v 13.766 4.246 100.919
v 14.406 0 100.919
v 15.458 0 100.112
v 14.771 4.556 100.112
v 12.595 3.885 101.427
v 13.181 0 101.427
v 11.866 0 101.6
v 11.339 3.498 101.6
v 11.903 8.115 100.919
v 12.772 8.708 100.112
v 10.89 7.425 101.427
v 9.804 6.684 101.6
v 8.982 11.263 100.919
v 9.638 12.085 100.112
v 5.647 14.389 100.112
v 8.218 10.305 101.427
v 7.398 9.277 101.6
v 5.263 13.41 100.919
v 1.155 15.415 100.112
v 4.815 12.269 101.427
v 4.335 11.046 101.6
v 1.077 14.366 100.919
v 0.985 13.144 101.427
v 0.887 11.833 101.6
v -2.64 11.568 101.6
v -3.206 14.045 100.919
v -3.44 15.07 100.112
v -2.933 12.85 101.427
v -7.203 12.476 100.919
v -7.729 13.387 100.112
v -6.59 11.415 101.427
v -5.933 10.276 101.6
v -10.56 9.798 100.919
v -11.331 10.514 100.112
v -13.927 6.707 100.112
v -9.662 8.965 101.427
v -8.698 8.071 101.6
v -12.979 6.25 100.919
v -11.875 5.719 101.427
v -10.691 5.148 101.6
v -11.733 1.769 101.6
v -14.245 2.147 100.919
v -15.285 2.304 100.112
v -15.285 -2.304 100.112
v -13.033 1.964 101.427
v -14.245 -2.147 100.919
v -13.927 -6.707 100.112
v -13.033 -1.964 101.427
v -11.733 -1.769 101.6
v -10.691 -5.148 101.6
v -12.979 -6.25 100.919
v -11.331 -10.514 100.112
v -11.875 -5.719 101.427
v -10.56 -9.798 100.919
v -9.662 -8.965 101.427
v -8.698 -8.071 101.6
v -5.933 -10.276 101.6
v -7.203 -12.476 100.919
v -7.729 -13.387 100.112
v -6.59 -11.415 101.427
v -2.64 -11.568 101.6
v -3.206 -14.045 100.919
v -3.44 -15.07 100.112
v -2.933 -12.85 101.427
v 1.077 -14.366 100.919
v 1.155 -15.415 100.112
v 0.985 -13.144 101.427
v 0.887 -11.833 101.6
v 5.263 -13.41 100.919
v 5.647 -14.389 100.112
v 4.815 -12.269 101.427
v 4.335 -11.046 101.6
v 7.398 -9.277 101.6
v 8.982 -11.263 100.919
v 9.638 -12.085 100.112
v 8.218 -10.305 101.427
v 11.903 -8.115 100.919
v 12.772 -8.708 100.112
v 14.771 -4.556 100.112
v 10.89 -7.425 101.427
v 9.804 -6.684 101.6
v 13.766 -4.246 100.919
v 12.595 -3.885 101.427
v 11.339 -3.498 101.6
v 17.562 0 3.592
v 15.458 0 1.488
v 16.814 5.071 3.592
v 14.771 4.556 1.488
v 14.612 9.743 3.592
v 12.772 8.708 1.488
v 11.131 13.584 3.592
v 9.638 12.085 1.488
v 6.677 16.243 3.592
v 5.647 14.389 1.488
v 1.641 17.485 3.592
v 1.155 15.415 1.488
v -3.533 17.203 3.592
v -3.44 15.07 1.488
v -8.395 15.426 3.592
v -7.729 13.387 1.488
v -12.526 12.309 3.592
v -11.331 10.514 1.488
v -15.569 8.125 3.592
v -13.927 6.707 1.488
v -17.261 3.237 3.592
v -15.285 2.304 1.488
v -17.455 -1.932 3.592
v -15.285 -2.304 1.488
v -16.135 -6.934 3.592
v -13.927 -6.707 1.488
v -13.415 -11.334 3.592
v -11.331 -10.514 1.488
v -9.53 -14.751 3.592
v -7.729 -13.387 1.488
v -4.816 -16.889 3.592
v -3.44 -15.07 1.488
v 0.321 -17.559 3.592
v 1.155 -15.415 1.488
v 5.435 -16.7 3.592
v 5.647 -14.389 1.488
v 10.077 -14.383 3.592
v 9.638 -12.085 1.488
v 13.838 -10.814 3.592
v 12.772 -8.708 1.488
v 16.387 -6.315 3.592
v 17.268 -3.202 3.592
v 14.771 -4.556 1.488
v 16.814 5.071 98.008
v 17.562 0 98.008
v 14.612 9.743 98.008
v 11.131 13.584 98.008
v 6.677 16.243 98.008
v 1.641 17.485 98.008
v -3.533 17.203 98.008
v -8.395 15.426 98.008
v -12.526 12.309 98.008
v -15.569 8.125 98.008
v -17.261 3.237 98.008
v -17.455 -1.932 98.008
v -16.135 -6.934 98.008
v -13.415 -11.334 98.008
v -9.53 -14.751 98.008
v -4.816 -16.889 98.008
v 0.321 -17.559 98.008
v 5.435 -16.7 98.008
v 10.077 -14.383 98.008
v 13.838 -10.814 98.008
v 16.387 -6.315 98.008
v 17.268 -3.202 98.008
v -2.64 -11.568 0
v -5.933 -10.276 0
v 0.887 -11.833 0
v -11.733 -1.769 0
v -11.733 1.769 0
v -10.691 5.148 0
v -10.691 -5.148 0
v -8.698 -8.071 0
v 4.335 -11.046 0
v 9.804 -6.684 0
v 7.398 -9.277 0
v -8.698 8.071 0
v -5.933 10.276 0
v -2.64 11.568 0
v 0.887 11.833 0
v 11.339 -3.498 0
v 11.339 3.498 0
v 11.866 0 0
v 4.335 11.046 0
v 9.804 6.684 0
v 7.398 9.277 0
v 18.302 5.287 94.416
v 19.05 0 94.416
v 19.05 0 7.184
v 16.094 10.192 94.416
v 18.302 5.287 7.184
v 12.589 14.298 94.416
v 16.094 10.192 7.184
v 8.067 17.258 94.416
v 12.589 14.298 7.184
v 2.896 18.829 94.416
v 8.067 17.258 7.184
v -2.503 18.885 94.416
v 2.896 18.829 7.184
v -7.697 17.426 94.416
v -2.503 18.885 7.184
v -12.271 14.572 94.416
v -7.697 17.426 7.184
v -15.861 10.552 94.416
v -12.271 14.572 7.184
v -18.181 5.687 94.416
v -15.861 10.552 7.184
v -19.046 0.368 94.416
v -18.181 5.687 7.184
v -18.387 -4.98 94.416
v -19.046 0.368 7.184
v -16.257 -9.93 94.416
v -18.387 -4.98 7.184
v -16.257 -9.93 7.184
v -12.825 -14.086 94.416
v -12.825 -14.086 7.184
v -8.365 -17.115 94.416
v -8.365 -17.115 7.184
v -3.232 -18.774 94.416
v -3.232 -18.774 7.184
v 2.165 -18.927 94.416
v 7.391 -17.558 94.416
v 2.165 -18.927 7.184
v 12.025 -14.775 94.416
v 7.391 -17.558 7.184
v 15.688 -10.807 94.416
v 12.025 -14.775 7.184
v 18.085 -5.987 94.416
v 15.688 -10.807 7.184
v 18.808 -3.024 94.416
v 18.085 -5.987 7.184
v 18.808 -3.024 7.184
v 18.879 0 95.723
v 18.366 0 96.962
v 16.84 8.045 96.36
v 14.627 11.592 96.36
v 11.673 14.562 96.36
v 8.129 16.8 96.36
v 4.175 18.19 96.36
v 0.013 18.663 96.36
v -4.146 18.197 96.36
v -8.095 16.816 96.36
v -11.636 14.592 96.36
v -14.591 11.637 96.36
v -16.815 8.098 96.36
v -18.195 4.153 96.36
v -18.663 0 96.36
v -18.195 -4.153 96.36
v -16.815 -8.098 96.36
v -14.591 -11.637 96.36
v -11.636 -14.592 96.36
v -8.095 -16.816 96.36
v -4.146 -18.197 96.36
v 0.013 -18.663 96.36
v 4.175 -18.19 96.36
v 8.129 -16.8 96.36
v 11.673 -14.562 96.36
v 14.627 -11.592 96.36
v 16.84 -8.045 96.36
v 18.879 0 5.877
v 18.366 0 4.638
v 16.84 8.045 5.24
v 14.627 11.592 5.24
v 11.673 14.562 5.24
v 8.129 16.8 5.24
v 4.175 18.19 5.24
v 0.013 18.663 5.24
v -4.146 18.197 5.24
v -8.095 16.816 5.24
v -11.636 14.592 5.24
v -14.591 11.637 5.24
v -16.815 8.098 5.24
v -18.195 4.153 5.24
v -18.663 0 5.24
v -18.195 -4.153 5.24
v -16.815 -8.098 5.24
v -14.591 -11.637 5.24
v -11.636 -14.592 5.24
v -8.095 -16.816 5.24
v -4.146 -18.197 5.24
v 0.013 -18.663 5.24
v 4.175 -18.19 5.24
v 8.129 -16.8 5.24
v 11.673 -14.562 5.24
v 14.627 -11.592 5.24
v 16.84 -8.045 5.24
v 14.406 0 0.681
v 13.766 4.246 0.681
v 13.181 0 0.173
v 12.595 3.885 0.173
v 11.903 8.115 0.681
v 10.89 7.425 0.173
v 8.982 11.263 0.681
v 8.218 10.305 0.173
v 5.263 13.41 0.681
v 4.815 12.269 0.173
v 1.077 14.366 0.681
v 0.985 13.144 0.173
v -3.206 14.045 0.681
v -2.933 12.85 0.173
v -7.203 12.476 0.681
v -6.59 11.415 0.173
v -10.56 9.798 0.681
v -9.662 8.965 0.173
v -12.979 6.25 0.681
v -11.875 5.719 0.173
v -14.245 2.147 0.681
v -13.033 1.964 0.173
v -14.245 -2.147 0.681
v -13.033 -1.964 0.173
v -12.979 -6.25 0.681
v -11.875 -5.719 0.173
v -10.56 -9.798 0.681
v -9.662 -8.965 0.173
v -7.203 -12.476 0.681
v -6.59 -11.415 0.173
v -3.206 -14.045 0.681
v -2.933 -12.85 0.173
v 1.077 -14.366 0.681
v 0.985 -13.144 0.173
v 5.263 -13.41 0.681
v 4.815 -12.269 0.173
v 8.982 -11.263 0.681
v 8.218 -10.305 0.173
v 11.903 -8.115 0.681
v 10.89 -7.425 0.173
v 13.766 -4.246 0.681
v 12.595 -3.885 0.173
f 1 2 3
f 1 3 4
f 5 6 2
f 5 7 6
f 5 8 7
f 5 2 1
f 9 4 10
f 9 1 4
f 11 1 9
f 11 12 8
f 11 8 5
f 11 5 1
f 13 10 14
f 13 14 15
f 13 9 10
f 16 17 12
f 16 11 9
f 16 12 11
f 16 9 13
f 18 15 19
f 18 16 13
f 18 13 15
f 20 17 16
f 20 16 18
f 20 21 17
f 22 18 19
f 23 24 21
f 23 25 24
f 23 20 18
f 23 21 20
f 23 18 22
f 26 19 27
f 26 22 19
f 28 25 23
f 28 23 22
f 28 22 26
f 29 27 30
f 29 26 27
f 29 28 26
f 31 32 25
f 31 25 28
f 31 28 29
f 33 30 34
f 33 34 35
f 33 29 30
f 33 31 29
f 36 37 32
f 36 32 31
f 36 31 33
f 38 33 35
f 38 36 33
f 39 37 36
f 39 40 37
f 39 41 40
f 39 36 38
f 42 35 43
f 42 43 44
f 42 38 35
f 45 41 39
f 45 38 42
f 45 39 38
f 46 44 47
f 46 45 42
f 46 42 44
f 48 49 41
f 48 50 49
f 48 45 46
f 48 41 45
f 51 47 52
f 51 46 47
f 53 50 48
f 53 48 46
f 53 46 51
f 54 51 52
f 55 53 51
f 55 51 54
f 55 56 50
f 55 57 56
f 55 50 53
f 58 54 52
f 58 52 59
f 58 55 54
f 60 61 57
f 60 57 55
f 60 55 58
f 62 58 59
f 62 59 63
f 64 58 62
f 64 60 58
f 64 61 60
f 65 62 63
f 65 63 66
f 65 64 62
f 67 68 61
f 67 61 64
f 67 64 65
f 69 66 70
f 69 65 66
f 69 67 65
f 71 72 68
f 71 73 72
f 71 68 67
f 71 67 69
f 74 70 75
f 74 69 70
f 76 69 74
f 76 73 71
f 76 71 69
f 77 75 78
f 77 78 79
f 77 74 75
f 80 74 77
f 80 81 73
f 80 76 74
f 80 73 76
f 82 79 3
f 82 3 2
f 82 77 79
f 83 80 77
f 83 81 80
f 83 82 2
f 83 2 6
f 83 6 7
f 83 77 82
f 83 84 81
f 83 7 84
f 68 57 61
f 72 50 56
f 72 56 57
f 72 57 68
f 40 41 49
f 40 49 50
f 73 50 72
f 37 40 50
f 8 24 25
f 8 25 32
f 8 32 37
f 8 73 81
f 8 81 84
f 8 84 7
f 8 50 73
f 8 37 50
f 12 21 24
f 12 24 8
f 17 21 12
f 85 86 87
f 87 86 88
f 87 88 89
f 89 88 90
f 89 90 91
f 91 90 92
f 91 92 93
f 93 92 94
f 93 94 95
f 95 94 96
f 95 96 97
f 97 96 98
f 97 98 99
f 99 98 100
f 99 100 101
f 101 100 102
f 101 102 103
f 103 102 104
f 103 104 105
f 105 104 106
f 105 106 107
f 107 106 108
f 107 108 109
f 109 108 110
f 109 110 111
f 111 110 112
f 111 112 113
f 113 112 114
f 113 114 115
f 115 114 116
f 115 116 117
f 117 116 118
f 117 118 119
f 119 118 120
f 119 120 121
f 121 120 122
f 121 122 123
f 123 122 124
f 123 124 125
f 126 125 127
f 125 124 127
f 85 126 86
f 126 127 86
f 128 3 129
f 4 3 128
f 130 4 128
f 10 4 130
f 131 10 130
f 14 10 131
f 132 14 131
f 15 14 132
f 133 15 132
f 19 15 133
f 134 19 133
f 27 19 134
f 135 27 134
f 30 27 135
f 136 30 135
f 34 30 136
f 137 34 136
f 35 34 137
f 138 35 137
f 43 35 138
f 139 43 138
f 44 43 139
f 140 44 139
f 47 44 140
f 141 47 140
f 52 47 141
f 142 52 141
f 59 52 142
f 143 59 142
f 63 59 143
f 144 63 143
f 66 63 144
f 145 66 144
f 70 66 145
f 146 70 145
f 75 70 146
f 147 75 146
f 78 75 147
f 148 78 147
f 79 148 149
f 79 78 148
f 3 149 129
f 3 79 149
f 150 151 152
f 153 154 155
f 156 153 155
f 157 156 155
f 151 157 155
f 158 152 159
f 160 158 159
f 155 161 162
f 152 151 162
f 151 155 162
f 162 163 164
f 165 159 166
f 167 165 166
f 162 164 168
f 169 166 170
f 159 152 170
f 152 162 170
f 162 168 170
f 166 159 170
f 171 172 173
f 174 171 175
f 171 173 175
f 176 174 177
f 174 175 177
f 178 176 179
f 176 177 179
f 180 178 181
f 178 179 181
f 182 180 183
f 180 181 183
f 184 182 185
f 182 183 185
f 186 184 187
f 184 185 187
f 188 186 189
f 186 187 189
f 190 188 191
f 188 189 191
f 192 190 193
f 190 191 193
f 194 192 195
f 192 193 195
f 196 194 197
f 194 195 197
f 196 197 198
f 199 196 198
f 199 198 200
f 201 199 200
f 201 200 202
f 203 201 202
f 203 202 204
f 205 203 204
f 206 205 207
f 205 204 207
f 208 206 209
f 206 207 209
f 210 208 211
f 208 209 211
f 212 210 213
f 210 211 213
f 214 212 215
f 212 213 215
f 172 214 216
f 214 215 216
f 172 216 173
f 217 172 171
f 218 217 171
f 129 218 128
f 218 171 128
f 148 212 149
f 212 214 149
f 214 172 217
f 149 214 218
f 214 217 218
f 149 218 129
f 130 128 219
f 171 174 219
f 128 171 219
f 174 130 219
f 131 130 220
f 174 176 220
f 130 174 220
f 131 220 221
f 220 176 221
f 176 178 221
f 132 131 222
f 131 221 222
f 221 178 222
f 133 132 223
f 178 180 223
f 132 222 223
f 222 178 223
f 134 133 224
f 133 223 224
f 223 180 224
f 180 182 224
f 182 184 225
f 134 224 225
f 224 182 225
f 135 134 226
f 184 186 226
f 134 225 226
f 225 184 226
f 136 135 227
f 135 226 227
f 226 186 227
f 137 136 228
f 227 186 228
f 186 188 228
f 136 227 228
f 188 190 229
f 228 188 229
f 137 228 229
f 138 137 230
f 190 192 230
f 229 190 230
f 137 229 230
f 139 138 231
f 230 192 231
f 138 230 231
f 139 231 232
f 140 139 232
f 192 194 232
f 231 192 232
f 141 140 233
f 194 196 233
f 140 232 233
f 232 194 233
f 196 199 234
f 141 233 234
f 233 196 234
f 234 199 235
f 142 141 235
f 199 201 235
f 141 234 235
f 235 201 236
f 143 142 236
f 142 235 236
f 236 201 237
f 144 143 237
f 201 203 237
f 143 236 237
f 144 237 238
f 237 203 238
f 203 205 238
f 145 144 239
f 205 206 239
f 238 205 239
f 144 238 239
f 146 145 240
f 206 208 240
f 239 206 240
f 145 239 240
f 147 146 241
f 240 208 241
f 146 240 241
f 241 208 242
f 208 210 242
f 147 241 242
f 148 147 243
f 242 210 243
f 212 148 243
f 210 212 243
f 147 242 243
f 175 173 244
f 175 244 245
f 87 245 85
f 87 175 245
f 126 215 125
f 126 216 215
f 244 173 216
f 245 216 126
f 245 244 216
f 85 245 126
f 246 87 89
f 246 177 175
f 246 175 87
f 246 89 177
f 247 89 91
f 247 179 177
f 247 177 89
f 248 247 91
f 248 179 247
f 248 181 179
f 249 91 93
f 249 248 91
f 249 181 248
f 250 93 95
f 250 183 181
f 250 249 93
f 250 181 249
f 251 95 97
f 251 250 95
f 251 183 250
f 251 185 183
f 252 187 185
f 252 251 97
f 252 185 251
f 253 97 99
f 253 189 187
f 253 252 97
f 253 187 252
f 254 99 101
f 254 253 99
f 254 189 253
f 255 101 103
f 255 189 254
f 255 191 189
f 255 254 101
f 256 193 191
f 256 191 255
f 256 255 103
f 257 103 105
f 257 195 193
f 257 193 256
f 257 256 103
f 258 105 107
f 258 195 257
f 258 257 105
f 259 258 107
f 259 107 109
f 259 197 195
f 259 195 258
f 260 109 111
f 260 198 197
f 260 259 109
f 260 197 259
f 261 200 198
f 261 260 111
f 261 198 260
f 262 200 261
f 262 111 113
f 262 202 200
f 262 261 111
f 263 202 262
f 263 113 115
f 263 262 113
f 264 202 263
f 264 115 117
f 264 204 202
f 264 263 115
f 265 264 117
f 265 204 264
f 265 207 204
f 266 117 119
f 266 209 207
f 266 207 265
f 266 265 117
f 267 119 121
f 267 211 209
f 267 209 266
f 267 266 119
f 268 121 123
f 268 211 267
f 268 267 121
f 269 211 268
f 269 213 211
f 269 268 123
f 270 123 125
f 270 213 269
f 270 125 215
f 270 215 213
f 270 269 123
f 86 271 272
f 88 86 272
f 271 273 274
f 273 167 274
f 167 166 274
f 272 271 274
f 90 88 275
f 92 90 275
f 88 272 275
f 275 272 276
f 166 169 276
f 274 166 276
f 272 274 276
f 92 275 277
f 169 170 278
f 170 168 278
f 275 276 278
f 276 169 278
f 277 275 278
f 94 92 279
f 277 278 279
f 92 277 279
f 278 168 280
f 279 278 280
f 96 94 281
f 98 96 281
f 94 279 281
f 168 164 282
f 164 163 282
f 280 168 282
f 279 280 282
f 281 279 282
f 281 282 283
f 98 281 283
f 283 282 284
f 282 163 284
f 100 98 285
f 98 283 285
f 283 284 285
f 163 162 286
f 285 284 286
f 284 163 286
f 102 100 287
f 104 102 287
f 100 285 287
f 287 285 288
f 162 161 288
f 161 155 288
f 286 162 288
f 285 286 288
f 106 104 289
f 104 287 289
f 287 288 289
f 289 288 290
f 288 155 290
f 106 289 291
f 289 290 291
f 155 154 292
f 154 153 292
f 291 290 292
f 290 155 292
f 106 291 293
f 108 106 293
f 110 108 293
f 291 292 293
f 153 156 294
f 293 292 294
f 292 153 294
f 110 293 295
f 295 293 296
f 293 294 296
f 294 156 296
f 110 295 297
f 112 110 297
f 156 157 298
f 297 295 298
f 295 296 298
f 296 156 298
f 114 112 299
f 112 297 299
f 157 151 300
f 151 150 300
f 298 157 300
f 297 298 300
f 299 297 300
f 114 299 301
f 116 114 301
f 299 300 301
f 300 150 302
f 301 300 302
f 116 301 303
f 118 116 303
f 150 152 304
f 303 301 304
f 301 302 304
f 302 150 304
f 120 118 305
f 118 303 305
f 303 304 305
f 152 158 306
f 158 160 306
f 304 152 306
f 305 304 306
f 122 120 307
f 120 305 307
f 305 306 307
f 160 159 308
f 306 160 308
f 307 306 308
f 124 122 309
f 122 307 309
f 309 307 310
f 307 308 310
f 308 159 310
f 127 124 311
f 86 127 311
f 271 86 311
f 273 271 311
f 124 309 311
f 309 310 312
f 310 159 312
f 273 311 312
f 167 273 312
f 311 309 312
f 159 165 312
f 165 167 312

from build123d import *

# Parameters (mm, degrees)
F0_R     = 19.05
F1_DEPTH = 101.6
F2_SIZE  = 5.08
F3_R     = 5.08


with BuildPart() as f1:
    # F0 (on Top) → F1 (new body)
    with BuildSketch(Plane.XY):
        Circle(F0_R)
    extrude(amount=F1_DEPTH)

    # F2
    f2_edges = [f1.edges().sort_by_distance(p)[0] for p in [
        (-19.05, 0, 101.6),
        (-19.05, 0, 0),
    ]]
    chamfer(f2_edges, length=F2_SIZE)

    # F3
    f3_edges = [f1.edges().sort_by_distance(p)[0] for p in [
        (19.05, 0, 50.8),
        (-19.05, 0, 5.08),
        (-19.05, 0, 96.52),
        (-13.97, 0, 0),
        (-13.97, 0, 101.6),
    ]]
    fillet(f3_edges, radius=F3_R)


solid = f1.part
